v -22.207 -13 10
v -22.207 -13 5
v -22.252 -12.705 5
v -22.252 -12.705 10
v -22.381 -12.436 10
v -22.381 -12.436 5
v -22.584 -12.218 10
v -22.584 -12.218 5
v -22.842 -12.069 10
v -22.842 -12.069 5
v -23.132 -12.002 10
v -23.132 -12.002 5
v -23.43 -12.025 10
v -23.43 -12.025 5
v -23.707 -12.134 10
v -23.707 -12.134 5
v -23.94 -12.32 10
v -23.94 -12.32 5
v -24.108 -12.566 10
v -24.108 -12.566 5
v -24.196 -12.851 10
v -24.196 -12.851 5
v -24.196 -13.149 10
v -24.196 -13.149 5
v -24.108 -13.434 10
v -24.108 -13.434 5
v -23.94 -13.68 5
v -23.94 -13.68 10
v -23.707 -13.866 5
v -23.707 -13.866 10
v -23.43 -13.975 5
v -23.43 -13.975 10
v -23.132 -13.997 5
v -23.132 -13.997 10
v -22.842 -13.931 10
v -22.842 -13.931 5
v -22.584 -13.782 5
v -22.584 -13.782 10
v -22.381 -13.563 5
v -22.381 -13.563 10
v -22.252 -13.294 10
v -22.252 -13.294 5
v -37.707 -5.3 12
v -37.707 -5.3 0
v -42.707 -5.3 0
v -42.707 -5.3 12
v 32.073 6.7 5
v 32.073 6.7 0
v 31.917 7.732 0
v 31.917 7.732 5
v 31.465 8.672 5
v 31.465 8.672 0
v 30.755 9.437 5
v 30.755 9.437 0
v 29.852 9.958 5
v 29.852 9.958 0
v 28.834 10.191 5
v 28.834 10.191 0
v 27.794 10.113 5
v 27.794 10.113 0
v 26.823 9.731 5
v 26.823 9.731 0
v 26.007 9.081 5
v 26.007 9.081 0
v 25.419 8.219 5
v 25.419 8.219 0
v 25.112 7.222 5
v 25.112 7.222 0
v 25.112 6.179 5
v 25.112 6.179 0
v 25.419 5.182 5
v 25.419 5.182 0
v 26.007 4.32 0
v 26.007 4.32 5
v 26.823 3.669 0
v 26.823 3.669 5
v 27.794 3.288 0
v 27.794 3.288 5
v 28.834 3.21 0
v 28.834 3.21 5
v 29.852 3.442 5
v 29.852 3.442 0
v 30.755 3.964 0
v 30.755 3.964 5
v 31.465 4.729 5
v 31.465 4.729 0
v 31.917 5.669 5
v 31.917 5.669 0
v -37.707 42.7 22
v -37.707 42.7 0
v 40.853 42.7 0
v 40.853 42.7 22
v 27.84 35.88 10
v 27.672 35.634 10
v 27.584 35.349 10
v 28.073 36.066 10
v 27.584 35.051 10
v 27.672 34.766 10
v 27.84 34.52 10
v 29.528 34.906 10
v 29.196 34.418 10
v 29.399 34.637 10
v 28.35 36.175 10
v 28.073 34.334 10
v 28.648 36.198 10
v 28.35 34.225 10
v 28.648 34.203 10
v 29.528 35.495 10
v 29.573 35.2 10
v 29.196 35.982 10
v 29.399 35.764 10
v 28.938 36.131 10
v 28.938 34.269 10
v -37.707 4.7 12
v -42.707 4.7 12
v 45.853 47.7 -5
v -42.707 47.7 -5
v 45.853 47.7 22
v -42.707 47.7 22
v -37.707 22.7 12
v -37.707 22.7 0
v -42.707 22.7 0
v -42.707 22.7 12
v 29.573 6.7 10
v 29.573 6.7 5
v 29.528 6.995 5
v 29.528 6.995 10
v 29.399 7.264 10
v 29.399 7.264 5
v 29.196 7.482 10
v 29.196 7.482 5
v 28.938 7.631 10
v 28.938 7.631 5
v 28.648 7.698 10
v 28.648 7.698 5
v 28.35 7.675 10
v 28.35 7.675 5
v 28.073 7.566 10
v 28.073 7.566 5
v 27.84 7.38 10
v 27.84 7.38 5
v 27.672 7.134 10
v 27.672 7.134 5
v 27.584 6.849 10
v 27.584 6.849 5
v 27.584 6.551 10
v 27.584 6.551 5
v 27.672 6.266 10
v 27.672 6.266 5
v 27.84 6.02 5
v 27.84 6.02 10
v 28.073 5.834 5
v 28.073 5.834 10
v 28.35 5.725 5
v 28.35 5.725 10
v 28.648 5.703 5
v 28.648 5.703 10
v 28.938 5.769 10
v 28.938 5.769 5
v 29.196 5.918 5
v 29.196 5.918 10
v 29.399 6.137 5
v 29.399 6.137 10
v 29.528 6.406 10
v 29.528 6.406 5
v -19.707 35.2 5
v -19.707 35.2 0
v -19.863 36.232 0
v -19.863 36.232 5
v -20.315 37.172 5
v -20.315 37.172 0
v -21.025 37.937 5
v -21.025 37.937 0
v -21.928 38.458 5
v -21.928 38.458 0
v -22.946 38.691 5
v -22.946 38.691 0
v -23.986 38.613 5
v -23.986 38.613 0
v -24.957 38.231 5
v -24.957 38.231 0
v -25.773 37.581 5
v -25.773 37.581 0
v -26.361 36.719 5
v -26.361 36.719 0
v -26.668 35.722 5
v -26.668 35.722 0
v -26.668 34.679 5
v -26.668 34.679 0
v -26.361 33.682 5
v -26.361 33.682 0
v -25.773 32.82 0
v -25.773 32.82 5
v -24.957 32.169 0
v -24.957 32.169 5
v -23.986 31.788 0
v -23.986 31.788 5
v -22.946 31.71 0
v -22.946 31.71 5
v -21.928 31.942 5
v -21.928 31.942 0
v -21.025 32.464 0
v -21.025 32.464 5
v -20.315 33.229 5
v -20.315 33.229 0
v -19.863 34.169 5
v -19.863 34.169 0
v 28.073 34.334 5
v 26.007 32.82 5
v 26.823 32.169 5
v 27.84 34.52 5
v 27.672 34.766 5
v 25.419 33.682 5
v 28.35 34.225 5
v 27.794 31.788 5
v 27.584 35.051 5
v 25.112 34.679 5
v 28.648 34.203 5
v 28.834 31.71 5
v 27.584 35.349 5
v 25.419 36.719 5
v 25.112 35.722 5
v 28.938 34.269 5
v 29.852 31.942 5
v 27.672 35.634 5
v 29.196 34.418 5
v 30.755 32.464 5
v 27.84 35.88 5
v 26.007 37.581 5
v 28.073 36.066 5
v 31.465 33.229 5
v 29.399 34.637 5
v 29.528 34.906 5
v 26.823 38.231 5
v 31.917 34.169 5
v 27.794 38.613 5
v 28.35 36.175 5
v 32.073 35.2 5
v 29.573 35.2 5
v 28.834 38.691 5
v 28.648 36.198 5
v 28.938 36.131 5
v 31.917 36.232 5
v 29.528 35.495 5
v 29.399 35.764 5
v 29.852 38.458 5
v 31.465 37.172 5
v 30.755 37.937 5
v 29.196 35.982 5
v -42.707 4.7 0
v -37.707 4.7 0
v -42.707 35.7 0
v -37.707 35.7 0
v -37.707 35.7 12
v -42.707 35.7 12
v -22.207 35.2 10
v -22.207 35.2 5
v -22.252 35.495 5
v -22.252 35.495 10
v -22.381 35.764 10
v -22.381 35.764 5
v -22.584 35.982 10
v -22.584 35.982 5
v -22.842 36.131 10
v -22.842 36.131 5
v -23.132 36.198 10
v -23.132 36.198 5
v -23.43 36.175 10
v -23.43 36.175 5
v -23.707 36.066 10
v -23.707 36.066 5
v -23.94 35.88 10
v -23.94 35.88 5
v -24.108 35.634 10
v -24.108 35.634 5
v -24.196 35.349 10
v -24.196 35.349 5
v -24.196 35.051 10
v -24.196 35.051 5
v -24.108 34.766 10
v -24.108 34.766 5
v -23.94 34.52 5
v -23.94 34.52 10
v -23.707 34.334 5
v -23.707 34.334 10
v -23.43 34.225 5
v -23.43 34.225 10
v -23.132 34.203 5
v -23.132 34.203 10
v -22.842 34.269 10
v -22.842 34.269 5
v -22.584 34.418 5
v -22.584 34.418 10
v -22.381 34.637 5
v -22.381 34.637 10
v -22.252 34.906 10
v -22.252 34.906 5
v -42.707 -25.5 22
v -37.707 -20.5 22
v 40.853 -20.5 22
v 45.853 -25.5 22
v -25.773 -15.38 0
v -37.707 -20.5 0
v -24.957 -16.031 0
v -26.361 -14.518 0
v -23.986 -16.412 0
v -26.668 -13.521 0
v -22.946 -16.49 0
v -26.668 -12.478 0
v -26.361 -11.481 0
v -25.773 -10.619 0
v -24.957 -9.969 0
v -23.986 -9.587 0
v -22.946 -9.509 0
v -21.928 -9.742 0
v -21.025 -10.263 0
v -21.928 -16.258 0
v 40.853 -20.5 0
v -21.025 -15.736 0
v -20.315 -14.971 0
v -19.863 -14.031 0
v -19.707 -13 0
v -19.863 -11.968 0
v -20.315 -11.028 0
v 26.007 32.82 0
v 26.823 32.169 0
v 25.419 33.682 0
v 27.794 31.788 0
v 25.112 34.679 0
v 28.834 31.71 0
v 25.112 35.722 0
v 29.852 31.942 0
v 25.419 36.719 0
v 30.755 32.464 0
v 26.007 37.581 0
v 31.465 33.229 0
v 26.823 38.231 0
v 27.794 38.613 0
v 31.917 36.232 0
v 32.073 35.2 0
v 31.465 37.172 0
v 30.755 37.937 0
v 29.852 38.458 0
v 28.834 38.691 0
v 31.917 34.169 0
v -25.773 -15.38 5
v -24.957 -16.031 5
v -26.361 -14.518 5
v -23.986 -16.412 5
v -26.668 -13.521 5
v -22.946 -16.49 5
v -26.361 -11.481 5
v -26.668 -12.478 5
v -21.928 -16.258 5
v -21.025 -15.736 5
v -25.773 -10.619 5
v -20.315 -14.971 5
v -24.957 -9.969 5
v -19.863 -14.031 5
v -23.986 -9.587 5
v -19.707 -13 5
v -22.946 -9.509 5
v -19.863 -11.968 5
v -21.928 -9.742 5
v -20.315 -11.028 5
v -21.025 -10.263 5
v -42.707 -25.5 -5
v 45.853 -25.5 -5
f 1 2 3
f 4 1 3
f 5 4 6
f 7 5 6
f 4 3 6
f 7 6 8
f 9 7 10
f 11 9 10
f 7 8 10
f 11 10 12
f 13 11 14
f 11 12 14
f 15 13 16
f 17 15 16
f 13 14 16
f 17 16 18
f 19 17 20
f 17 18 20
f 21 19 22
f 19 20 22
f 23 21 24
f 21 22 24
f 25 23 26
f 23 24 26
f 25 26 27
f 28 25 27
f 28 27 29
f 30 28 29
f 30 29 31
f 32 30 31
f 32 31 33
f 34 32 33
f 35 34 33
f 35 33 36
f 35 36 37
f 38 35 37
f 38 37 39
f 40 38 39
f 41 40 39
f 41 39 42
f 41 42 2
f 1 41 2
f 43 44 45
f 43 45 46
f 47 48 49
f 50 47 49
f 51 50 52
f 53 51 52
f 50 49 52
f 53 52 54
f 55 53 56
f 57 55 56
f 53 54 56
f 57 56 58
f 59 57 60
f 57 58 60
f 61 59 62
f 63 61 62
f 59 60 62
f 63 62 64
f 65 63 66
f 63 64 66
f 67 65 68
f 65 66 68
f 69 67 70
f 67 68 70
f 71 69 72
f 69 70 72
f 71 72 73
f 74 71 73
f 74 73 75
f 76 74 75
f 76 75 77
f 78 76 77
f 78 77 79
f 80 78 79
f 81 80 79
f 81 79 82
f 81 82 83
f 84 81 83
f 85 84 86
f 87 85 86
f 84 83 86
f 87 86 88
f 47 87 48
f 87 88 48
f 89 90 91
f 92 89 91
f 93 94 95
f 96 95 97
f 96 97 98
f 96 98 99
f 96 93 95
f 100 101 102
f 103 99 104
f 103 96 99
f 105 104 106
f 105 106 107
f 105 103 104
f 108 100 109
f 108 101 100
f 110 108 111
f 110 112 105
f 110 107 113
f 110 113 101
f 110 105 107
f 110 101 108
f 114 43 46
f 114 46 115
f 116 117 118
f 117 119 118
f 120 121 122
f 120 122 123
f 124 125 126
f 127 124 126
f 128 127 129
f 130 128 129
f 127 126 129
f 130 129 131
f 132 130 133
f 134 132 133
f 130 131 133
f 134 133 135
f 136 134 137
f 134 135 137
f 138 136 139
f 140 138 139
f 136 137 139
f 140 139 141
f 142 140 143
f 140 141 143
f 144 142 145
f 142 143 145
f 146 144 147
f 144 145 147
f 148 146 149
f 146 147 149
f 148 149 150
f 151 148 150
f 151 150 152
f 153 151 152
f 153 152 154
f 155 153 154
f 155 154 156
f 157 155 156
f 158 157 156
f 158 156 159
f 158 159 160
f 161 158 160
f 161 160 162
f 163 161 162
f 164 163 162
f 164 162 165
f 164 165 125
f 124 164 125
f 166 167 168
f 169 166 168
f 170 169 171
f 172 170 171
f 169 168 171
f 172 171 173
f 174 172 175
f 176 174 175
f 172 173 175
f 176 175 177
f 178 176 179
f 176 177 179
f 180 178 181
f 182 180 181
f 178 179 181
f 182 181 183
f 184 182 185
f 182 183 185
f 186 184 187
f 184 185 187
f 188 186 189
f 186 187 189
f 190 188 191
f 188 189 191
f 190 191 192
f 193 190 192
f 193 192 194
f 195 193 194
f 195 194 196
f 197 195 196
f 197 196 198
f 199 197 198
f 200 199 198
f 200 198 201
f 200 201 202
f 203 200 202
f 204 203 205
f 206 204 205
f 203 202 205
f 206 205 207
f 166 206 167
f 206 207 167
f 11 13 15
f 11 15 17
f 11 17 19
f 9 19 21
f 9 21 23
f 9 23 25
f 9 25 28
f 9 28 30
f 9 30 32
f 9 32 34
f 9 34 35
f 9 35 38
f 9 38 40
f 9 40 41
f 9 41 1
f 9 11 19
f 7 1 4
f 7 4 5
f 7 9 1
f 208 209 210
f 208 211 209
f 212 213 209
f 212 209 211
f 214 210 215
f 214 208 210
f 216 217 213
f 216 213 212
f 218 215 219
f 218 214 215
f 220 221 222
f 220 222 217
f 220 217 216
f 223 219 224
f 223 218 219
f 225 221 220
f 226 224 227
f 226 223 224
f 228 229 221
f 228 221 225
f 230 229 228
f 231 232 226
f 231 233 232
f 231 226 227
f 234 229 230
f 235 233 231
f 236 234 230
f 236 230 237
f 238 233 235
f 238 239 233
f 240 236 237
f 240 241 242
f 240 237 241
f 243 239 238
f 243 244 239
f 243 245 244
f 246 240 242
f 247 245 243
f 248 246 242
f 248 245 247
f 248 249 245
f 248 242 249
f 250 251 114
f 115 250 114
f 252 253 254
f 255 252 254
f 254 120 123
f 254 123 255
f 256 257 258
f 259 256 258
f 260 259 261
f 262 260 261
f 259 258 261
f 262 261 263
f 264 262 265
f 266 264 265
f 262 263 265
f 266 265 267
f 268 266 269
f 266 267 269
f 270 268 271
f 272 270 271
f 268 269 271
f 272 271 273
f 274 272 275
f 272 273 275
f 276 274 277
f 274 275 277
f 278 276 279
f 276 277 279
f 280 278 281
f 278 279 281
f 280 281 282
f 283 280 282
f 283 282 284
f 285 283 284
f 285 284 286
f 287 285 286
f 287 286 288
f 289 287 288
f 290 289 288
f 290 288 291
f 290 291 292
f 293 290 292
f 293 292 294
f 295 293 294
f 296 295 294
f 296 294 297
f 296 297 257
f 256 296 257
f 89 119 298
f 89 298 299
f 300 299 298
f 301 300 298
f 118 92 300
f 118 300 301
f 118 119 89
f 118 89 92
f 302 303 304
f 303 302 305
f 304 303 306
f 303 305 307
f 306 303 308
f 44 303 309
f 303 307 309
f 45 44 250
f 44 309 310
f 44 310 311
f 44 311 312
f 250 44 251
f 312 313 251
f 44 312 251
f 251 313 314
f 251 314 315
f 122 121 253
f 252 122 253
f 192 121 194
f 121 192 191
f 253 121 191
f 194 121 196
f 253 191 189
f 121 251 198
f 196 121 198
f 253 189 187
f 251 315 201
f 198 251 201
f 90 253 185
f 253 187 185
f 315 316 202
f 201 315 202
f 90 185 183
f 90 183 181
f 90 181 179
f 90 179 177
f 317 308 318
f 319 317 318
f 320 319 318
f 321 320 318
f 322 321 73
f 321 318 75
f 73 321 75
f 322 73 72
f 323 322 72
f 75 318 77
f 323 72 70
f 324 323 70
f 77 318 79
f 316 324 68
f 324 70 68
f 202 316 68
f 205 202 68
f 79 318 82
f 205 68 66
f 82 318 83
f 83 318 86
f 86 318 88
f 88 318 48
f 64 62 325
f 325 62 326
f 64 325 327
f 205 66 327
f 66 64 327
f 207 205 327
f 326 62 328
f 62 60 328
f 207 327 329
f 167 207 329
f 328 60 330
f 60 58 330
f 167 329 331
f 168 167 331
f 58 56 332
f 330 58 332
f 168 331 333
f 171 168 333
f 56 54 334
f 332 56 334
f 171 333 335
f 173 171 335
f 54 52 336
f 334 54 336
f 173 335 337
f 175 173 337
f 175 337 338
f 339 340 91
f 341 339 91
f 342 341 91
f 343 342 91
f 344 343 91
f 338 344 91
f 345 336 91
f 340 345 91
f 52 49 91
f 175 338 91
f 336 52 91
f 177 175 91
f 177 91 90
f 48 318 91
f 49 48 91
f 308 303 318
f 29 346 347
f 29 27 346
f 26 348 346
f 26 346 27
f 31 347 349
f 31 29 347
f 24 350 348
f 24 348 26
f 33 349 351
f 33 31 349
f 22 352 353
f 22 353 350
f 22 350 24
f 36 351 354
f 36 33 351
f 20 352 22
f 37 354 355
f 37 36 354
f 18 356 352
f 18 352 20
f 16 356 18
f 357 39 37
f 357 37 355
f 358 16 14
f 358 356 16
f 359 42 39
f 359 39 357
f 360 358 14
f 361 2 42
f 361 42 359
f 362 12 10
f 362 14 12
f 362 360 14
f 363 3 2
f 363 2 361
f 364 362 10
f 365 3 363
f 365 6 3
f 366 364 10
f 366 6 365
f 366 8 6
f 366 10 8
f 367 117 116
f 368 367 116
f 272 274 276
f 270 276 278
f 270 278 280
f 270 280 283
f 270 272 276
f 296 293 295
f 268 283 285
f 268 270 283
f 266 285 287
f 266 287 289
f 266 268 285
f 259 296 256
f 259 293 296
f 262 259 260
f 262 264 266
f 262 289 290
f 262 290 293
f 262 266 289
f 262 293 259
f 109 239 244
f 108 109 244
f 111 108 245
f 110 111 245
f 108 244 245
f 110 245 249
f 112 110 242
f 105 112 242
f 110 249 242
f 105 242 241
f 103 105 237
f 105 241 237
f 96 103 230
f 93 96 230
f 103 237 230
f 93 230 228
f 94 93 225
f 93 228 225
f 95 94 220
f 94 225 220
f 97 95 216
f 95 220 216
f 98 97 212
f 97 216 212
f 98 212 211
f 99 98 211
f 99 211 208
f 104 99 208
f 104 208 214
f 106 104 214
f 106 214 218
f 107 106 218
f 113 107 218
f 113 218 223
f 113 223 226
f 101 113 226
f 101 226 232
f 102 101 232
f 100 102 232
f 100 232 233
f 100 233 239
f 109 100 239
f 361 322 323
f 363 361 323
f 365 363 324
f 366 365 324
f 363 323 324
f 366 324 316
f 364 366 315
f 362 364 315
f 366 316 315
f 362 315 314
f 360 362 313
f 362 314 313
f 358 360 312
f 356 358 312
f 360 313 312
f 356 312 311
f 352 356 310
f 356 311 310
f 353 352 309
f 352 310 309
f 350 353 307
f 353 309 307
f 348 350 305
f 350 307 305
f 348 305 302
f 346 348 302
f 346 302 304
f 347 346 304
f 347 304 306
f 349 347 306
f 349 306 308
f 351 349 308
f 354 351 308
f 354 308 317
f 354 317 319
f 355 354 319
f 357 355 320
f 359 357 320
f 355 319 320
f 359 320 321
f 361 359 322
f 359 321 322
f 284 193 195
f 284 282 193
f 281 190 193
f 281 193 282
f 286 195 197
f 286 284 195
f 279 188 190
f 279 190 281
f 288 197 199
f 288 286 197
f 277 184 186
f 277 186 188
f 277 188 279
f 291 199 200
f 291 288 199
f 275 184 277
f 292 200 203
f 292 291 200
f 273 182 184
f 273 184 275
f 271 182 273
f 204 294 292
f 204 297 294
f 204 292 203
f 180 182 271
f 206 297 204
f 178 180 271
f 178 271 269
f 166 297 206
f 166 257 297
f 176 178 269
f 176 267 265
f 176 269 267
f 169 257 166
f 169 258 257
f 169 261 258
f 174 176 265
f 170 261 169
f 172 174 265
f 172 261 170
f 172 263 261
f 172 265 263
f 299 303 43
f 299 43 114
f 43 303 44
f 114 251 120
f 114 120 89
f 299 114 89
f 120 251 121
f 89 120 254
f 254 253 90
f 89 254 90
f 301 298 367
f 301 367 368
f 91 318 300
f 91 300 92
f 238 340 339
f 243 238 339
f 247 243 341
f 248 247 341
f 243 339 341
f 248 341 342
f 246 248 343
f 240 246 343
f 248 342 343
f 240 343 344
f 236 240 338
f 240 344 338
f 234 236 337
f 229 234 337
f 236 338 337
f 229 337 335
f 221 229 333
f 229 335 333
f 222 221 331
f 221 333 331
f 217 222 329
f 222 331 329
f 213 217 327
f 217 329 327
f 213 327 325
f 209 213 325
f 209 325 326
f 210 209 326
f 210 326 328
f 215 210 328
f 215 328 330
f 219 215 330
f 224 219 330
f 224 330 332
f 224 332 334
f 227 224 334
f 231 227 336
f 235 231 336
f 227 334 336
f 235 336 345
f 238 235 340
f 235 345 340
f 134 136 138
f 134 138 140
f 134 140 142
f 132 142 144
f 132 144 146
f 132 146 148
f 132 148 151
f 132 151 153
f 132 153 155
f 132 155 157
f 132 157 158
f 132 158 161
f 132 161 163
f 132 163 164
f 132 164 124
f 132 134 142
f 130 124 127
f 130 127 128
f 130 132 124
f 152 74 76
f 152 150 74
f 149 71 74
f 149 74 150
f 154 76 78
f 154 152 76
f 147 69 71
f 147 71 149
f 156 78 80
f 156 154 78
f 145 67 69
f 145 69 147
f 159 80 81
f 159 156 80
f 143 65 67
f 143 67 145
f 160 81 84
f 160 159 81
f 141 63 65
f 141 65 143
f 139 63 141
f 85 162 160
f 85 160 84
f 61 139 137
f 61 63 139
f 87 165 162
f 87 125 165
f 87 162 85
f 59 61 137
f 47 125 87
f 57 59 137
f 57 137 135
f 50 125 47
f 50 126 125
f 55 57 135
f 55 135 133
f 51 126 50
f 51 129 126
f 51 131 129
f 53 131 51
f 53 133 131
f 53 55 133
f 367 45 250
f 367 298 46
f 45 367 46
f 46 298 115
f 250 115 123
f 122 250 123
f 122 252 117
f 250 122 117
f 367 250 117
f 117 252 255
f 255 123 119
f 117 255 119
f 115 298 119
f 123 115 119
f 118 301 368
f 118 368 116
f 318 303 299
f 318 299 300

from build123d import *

# Parameters (mm, degrees)
F1_W          = 88.56
F1_H          = 73.2
F2_DEPTH      = 22
F2_DEPTH_BACK = 5
F3_W          = 78.56
F3_H          = 63.2
F4_DEPTH      = 34.1
F7_R          = 3.5
F7_R_2        = 1
F8_DEPTH      = 5
F6_W          = 13
F6_H          = 12
F6_W_2        = 10
F9_DEPTH      = 25
F10_R         = 1
F11_DEPTH     = 10


with BuildPart() as f2:
    # F1 (on Top) → F2 (new body, two sides)
    with BuildSketch(Plane.XY) as f2_sk:
        with Locations((1.572817, 11.100315)):
            Rectangle(F1_W, F1_H)
    extrude(amount=F2_DEPTH)
    extrude(f2_sk.sketch, amount=-F2_DEPTH_BACK)

    # F3 (on Top) → F4 (cut)
    with BuildSketch(Plane.XY):
        with Locations((1.572817, 11.100315)):
            Rectangle(F3_W, F3_H)
    extrude(amount=F4_DEPTH, mode=Mode.SUBTRACT)

    # F7 (on face) → F8 (join)
    with BuildSketch(Plane.XY):
        with Locations((28.572817, 35.200315)):
            Circle(F7_R)
        with Locations((28.572817, 35.200315)):
            Circle(F7_R_2, mode=Mode.SUBTRACT)
        with Locations((28.572817, 6.700315)):
            Circle(F7_R)
        with Locations((28.572817, 6.700315)):
            Circle(F7_R_2, mode=Mode.SUBTRACT)
        with Locations((-23.207183, 35.200315)):
            Circle(F7_R)
        with Locations((-23.207183, 35.200315)):
            Circle(F7_R_2, mode=Mode.SUBTRACT)
        with Locations((-23.207183, -12.999685)):
            Circle(F7_R)
        with Locations((-23.207183, -12.999685)):
            Circle(F7_R_2, mode=Mode.SUBTRACT)
    extrude(amount=F8_DEPTH)

    # F6 (on face) → F9 (cut)
    with BuildSketch(Plane.YZ.offset(-37.707183)):
        with Locations((29.200315, 6)):
            Rectangle(F6_W, F6_H)
        with Locations((-0.299685, 6)):
            Rectangle(F6_W_2, F6_H)
    extrude(amount=-F9_DEPTH, mode=Mode.SUBTRACT)

    # F10 (on face) → F11 (join)
    with BuildSketch(Plane.XY):
        with Locations((28.572817, 35.200315)):
            Circle(F10_R)
        with Locations((28.572817, 6.700315)):
            Circle(F10_R)
        with Locations((-23.207183, -12.999685)):
            Circle(F10_R)
        with Locations((-23.207183, 35.200315)):
            Circle(F10_R)
    extrude(amount=F11_DEPTH)


solid = f2.part
